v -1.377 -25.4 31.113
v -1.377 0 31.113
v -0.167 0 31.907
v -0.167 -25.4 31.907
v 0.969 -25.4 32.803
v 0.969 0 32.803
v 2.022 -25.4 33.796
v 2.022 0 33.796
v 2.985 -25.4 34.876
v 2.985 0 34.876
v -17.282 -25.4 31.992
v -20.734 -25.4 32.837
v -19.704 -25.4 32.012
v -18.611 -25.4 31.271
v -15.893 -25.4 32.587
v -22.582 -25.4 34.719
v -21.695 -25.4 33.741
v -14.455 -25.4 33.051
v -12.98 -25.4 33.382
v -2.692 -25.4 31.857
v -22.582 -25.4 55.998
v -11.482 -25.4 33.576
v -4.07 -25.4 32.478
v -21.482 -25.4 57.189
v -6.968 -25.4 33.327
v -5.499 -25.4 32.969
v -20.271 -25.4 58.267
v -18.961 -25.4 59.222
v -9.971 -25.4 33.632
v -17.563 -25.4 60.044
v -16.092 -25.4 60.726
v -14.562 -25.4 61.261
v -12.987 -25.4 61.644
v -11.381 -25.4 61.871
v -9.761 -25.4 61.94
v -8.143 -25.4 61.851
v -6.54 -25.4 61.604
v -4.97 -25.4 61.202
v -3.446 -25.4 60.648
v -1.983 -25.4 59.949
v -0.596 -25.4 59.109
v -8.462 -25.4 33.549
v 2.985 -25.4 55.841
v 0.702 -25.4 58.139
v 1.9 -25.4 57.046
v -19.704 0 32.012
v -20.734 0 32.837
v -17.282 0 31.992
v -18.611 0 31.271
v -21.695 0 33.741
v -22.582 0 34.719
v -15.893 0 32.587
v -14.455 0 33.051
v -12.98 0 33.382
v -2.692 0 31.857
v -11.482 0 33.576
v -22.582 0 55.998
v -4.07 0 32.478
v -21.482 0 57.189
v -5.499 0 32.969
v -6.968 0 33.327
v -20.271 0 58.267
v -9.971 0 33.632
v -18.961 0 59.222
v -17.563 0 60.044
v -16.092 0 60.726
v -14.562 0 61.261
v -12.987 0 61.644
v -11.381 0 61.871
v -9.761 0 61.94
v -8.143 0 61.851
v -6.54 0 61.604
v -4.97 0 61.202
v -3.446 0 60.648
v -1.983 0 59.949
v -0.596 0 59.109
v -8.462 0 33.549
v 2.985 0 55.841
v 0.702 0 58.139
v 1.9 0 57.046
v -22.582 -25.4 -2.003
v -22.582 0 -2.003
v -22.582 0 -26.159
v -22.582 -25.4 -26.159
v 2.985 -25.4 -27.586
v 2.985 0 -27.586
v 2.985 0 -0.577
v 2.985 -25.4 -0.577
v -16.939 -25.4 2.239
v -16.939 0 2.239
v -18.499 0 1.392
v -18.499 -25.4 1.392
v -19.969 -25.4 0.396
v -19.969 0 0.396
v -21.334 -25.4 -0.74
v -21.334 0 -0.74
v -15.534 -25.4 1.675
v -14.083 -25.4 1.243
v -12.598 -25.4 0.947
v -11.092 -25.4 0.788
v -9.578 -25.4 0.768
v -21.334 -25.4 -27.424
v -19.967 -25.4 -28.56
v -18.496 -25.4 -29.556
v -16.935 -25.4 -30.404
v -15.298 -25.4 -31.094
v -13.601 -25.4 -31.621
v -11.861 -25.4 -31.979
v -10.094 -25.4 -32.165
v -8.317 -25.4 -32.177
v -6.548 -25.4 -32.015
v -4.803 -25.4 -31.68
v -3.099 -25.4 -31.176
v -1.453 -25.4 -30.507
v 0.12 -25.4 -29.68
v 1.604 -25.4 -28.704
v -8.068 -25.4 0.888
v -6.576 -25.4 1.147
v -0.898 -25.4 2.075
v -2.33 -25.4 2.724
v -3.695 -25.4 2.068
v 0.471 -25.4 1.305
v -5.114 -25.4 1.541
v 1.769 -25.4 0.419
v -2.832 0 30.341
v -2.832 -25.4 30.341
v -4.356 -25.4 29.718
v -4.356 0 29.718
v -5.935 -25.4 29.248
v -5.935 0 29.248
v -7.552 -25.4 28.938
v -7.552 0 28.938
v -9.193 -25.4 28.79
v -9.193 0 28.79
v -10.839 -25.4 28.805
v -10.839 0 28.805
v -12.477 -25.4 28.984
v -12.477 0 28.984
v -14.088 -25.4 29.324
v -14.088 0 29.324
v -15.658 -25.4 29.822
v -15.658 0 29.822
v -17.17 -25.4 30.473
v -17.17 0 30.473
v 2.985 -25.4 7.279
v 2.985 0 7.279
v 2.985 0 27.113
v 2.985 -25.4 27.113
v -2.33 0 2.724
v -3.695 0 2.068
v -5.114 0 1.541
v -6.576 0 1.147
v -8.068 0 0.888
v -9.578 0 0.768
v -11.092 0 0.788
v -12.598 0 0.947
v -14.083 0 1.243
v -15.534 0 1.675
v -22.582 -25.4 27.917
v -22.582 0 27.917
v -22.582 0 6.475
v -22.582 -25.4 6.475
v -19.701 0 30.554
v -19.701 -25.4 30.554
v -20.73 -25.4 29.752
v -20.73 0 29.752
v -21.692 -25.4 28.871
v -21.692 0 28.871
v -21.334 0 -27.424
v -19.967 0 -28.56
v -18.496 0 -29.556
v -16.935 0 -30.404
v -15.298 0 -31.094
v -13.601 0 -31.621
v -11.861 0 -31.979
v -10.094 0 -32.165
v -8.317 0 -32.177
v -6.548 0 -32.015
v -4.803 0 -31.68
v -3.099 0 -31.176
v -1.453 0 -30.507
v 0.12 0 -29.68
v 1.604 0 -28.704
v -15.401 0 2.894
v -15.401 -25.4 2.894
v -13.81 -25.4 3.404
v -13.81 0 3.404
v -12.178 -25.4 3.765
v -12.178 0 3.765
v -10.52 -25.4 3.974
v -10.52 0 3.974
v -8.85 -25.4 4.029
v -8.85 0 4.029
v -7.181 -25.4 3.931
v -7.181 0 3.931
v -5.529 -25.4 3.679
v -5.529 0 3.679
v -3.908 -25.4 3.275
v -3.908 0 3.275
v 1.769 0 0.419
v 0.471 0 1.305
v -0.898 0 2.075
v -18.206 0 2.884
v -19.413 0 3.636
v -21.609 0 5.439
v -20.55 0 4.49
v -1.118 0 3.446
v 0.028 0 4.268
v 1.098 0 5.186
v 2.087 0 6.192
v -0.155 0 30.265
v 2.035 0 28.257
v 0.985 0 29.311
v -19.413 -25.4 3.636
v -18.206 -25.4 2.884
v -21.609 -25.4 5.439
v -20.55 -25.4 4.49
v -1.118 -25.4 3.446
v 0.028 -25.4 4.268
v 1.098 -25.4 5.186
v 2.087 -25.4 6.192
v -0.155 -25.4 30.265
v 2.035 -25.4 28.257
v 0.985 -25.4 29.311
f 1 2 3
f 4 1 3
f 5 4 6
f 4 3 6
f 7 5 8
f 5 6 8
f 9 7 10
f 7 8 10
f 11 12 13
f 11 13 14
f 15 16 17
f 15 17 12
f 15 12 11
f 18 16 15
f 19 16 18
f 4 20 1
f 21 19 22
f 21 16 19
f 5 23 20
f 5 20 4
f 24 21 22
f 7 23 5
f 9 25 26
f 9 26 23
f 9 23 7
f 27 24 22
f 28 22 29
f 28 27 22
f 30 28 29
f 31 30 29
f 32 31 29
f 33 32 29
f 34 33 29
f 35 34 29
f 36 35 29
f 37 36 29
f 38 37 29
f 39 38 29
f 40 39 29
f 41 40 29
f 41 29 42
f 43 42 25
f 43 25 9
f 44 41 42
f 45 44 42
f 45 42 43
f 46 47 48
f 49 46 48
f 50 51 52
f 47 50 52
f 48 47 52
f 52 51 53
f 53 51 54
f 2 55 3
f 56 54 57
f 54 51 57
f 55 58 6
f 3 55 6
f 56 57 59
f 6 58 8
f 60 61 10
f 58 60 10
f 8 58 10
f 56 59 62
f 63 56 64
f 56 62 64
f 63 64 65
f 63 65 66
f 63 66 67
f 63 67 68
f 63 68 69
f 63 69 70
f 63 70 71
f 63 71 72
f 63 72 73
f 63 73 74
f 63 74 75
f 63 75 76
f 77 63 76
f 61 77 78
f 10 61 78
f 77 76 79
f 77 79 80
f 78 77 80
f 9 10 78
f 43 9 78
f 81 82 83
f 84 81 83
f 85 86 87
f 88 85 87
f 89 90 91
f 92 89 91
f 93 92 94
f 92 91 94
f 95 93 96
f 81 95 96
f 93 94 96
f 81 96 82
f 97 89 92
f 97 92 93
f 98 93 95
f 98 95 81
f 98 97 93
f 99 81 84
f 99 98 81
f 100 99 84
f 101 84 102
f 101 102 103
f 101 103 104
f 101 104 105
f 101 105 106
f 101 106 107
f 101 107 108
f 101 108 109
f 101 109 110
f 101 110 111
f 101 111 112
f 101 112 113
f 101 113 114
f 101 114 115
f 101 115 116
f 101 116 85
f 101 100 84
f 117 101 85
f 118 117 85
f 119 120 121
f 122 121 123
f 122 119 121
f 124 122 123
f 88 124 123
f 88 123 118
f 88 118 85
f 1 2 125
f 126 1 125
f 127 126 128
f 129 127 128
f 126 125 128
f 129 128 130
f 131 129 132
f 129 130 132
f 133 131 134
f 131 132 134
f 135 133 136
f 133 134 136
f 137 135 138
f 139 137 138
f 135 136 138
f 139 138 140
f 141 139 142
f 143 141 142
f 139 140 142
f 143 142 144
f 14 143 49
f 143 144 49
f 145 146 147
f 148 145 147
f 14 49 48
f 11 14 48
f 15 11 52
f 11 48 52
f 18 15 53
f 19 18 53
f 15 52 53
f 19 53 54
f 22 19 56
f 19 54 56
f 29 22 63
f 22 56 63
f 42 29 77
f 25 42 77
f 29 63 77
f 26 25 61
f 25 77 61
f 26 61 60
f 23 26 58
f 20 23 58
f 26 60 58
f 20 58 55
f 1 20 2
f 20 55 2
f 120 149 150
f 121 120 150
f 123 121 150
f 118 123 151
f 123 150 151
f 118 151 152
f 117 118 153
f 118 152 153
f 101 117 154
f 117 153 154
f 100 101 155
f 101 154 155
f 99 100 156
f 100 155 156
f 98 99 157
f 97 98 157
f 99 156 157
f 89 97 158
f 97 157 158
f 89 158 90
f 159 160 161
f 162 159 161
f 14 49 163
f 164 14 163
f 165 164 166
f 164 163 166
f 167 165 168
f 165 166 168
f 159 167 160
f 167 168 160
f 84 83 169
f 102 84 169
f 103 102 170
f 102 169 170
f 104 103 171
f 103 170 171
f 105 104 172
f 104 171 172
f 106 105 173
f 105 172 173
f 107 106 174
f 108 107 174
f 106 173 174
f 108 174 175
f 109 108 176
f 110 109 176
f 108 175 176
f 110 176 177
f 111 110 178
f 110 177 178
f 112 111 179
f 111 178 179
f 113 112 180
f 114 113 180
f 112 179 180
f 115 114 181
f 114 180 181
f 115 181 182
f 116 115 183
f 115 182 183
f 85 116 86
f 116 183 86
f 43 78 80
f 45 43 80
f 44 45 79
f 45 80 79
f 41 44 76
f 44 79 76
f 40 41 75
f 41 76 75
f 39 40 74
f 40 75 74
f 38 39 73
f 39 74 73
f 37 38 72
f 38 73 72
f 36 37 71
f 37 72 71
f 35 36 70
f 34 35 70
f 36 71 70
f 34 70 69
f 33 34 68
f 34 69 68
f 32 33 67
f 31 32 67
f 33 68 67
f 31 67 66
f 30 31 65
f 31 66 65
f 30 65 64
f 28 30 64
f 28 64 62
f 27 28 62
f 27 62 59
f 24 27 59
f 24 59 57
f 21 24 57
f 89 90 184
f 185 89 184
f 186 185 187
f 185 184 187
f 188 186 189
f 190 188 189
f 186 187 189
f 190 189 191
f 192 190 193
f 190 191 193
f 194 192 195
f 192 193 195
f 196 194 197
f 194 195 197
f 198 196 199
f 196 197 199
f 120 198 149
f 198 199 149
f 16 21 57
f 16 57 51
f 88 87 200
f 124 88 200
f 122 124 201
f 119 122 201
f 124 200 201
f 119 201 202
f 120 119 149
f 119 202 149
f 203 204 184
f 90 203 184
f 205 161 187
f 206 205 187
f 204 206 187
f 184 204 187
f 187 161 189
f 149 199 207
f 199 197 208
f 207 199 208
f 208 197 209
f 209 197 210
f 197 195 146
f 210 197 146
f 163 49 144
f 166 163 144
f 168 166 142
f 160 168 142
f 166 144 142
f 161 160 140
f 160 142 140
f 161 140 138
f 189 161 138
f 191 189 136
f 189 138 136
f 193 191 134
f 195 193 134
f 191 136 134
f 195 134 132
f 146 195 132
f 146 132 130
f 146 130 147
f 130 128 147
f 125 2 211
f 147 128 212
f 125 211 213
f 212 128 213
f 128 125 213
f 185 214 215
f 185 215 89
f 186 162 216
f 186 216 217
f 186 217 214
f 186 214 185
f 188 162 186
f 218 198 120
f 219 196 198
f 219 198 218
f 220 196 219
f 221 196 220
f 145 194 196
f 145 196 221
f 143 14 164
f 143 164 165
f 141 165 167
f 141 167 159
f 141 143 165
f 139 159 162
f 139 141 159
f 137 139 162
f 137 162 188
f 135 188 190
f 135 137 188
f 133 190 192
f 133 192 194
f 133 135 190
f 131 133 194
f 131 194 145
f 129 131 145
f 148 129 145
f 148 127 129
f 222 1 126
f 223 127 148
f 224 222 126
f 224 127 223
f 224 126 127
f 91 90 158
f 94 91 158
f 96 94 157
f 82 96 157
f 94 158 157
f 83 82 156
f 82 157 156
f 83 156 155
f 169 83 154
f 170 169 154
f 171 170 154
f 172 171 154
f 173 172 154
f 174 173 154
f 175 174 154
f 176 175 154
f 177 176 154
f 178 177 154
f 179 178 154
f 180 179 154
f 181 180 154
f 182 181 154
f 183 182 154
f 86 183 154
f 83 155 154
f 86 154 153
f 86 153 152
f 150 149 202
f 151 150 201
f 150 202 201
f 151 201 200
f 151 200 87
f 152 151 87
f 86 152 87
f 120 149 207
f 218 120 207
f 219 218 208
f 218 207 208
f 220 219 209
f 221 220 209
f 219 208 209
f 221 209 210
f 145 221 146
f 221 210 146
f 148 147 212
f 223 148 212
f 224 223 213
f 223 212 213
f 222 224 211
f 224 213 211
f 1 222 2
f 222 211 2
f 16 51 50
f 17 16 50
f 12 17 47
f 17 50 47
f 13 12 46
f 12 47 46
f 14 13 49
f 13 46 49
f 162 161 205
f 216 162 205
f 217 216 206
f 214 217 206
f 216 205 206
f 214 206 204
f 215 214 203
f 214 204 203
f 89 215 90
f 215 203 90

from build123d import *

# Parameters (mm, degrees)
F1_DEPTH = 25.4


with BuildPart() as f1:
    # F0 (on Front) → F1 (new body)
    with BuildSketch(Plane.XZ):
        with BuildLine():
            ThreePointArc((2.9849638231, 55.841046589), (-9.7614743803, 61.9401882116), (-22.581897676, 55.9981378983))
            Line((-22.581897676, 55.9981378983), (-22.581897676, 34.7187977959))
            ThreePointArc((-22.581897676, 34.7187977959), (-20.7339157895, 32.8366946633), (-18.6108785729, 31.2714272002))
            ThreePointArc((-18.6108785729, 31.2714272002), (-9.9714363538, 33.6319387195), (-1.3769697054, 31.1125896929))
            ThreePointArc((-1.3769697054, 31.1125896929), (0.9686810311, 32.8033588814), (2.9849638231, 34.8758891053))
            Line((2.9849638231, 34.8758891053), (2.9849638231, 55.841046589))
        make_face()
    extrude(amount=F1_DEPTH)


with BuildPart() as f1b:
    # F0 (on Front) → F1, piece 2 (new body)
    with BuildSketch(Plane.XZ):
        with BuildLine():
            ThreePointArc((-18.6108785729, 31.2714272002), (-20.7298421272, 29.7521275364), (-22.581897676, 27.9168705362))
            Line((-22.581897676, 27.9168705362), (-22.581897676, 6.4750989062))
            ThreePointArc((-22.581897676, 6.4750989062), (-19.9904965776, 4.0508543415), (-16.9391677392, 2.2393042641))
            ThreePointArc((-16.9391677392, 2.2393042641), (-9.6855767528, 4.0210300271), (-2.3297951619, 2.7242624769))
            ThreePointArc((-2.3297951619, 2.7242624769), (0.5728460014, 4.7154345625), (2.9849638231, 7.2789828089))
            Line((2.9849638231, 7.2789828089), (2.9849638231, 27.1129866335))
            ThreePointArc((2.9849638231, 27.1129866335), (0.9854877512, 29.3107203891), (-1.3769697054, 31.1125896929))
            ThreePointArc((-1.3769697054, 31.1125896929), (-10.0161809522, 28.7771387188), (-18.6108785729, 31.2714272002))
        make_face()
    extrude(amount=F1_DEPTH)


with BuildPart() as f1c:
    # F0 (on Front) → F1, piece 3 (new body)
    with BuildSketch(Plane.XZ):
        with BuildLine():
            ThreePointArc((-16.9391677392, 2.2393042641), (-19.9692385493, 0.3956202808), (-22.581897676, -2.00323612))
            Line((-22.581897676, -2.00323612), (-22.581897676, -26.1592470059))
            ThreePointArc((-22.581897676, -26.1592470059), (-10.0938178152, -32.1653491647), (2.9849638231, -27.5859526312))
            Line((2.9849638231, -27.5859526312), (2.9849638231, -0.5765304947))
            ThreePointArc((2.9849638231, -0.5765304947), (0.4711836848, 1.3050819337), (-2.3297951619, 2.7242624769))
            ThreePointArc((-2.3297951619, 2.7242624769), (-9.5776050492, 0.7683810261), (-16.9391677392, 2.2393042641))
        make_face()
    extrude(amount=F1_DEPTH)


solid = Compound([f1.part, f1b.part, f1c.part])
